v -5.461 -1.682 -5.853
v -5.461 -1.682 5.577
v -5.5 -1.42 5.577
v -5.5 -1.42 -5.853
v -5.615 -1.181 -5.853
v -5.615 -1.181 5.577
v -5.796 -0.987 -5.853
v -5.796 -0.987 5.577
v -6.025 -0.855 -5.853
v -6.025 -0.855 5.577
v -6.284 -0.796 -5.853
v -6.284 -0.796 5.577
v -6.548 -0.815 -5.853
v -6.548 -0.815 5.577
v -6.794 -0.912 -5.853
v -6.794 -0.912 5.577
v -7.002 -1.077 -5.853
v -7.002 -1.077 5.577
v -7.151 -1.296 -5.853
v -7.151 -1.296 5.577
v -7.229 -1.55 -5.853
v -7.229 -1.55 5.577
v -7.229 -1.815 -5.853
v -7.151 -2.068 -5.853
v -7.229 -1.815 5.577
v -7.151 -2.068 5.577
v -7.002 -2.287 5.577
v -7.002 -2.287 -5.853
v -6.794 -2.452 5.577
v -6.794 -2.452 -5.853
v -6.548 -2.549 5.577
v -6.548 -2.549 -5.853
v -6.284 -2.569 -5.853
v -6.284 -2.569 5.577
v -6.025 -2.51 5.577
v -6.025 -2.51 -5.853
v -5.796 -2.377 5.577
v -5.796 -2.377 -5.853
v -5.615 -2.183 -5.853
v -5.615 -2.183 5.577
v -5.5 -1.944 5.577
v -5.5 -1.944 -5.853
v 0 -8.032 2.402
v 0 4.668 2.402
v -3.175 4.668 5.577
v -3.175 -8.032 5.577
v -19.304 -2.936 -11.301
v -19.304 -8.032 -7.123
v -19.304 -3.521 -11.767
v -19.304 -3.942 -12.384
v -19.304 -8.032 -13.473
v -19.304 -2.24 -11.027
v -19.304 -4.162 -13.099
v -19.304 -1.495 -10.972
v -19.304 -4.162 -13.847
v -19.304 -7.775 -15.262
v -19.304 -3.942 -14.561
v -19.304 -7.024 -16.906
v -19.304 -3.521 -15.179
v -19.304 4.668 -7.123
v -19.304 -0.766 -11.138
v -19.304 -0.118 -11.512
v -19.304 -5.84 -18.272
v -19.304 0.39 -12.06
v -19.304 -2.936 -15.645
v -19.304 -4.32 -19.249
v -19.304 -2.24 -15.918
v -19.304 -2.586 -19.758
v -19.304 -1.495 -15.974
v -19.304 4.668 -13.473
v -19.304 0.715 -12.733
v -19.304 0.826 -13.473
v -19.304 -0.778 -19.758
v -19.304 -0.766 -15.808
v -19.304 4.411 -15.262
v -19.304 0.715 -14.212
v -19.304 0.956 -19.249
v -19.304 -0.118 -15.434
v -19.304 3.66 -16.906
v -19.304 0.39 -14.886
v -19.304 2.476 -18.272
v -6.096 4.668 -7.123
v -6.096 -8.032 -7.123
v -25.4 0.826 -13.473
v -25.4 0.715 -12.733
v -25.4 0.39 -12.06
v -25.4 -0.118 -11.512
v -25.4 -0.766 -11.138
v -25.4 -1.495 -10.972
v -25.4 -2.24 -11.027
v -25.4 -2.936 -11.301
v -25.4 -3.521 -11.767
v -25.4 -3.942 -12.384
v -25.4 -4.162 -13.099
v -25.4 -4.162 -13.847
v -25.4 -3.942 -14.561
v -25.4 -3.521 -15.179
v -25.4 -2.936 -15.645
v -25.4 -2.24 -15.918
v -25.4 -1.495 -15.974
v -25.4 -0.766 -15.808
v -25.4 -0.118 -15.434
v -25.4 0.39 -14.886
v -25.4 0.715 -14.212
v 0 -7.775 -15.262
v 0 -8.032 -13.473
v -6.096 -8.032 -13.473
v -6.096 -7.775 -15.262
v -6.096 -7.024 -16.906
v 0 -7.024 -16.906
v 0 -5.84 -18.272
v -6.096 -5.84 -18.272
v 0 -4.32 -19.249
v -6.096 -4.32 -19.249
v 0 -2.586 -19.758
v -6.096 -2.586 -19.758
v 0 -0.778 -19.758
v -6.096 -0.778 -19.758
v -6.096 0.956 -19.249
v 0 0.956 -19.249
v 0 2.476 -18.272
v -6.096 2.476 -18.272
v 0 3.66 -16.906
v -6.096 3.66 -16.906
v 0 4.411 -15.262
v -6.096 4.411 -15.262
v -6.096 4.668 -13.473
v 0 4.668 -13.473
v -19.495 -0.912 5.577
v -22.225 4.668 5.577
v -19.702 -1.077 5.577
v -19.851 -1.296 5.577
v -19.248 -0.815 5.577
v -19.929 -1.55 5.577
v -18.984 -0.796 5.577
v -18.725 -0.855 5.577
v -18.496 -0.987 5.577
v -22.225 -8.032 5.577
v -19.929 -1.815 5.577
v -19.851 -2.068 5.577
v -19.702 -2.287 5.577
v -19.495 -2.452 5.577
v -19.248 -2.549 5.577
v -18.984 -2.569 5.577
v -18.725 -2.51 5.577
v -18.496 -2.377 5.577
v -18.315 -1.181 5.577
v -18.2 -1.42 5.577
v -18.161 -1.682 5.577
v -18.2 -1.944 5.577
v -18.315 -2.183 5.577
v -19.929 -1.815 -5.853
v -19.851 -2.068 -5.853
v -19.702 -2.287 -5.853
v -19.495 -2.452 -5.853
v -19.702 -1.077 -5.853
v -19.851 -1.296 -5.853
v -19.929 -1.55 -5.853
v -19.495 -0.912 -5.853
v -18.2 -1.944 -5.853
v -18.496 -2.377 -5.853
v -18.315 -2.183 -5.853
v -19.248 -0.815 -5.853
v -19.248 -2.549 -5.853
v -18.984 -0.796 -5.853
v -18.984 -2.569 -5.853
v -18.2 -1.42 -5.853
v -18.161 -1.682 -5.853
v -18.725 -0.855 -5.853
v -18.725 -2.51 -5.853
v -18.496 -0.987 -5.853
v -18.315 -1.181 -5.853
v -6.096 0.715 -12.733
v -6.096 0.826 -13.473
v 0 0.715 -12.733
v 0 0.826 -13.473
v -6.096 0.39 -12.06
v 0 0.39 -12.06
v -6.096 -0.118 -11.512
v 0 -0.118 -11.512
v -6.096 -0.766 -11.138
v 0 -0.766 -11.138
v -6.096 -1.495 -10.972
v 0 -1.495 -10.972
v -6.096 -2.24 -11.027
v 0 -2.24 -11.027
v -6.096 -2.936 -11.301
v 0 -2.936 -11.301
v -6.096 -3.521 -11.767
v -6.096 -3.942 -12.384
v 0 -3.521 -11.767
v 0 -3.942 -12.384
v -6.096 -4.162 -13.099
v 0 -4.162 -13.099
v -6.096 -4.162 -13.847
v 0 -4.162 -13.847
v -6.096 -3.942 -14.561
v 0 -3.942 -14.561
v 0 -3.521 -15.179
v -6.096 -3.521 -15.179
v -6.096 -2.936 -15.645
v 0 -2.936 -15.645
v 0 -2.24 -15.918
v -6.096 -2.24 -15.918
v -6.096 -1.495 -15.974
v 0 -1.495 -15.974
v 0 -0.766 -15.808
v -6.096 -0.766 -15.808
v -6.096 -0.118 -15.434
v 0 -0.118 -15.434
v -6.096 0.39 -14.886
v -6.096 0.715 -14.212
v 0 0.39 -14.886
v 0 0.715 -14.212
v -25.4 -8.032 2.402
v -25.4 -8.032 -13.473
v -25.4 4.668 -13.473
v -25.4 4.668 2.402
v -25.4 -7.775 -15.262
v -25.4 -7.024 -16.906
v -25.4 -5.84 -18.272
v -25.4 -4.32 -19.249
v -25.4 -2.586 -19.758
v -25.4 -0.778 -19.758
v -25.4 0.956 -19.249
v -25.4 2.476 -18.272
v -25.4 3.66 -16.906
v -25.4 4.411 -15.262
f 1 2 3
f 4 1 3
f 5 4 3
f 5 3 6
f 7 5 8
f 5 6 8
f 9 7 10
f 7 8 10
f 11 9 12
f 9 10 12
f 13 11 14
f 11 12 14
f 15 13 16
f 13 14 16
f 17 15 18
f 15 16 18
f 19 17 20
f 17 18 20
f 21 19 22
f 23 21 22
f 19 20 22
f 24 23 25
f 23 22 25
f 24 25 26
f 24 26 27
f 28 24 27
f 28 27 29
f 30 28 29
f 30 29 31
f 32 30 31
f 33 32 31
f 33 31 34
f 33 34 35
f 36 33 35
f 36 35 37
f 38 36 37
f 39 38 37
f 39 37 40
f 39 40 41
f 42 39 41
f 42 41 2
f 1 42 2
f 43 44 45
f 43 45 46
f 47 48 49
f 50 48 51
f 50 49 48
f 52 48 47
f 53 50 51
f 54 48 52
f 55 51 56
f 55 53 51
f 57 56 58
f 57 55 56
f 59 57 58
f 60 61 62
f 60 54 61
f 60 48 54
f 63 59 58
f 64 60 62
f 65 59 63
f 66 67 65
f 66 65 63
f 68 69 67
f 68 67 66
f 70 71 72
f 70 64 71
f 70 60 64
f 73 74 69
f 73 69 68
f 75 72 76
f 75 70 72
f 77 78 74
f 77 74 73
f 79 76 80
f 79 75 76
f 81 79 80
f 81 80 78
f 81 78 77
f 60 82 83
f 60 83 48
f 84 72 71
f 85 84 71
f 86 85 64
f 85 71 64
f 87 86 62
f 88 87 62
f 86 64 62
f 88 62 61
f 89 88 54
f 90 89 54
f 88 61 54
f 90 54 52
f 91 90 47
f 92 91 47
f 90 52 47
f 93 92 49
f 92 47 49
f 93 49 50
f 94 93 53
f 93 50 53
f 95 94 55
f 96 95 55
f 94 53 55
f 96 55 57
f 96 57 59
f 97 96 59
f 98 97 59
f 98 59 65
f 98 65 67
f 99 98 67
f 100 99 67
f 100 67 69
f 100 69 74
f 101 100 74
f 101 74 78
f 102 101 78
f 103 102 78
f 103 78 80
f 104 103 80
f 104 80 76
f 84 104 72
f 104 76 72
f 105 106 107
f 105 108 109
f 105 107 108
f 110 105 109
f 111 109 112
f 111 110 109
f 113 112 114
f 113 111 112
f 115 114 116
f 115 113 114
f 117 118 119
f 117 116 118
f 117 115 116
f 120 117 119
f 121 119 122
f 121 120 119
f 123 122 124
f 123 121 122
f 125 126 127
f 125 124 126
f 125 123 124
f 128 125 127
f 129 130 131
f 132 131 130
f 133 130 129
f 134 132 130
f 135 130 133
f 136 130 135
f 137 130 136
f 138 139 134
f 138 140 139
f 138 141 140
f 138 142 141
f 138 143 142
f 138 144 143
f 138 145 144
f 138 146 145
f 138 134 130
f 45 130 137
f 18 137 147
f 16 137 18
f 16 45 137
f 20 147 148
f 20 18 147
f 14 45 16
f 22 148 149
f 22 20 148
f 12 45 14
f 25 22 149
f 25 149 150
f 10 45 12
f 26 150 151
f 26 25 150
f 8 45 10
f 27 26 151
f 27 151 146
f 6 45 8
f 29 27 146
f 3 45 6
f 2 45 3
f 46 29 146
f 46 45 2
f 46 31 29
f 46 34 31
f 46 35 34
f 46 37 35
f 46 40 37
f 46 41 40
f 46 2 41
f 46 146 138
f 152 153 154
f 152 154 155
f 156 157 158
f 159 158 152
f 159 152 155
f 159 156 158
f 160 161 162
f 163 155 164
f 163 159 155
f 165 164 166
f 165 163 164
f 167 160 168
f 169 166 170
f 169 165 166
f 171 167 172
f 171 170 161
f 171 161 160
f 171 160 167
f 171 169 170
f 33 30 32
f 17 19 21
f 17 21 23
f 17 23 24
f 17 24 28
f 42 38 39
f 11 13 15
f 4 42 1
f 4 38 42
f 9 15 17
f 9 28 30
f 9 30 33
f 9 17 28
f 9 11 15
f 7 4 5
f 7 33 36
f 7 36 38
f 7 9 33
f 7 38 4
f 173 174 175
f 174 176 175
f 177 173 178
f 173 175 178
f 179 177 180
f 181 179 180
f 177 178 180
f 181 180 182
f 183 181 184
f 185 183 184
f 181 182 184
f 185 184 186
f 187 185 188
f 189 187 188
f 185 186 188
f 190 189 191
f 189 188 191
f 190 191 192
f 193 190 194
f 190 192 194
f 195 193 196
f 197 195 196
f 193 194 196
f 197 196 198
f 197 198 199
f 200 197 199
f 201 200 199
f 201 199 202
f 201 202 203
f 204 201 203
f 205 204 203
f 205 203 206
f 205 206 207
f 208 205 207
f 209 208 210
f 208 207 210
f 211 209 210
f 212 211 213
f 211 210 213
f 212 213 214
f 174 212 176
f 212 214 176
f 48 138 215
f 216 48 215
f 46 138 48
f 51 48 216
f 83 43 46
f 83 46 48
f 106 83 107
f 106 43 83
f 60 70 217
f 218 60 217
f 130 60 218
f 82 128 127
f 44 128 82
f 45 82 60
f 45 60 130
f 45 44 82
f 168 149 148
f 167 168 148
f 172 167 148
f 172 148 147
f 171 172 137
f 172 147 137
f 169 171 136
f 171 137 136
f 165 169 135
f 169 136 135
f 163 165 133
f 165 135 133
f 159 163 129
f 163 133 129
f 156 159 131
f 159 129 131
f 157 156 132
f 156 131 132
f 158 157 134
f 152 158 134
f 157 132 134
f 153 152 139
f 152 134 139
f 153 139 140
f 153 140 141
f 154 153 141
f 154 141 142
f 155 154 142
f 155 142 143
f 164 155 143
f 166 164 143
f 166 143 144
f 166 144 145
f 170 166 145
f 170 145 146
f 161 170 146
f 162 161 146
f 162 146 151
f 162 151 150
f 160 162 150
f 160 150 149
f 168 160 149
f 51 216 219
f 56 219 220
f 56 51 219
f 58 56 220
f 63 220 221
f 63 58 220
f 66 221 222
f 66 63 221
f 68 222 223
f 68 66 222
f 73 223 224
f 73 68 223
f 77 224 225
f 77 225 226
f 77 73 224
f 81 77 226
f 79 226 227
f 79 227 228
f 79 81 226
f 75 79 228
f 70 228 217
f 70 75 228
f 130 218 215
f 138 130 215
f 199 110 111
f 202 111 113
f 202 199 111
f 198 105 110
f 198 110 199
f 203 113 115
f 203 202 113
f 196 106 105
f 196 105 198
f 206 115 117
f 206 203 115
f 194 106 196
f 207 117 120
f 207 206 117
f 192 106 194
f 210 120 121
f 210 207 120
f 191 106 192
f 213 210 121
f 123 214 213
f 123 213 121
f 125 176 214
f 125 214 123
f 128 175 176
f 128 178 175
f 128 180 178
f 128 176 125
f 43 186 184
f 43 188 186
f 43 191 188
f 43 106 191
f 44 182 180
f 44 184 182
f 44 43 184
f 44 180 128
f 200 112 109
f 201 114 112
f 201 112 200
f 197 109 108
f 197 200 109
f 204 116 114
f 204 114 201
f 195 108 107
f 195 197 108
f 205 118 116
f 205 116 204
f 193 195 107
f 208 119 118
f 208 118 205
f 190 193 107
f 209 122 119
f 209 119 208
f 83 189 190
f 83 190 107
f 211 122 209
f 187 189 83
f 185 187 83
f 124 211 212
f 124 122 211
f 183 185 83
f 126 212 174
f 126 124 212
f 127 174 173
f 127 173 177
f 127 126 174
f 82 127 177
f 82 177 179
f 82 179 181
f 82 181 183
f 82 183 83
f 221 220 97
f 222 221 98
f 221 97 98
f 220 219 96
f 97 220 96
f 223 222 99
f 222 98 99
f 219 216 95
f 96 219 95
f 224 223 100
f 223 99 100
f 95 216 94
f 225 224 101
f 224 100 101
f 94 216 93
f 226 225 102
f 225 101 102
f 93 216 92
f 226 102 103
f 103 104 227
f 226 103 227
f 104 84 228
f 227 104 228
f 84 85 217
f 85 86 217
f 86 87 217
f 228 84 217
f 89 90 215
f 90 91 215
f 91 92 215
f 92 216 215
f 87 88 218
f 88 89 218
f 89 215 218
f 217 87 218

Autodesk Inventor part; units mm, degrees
ref_plane "YZ Plane" through (0, 0, 0) normal (1, 0, 0) x (0, 1, 0)
ref_plane "XZ Plane" through (0, 0, 0) normal (0, 1, 0) x (-1, 0, 0)
ref_plane "XY Plane" through (0, 0, 0) normal (0, 0, 1) x (1, 0, 0)
sketch "Sketch1" plane through (0, 0, 0) normal (1, 0, 0) x (0, 1, 0)
  line L0 (4.6679, 5.5772) -> (-8.0321, 5.5772)
  line L1 (-8.0321, 5.5772) -> (-8.0321, -13.4728)
  line L2 (-1.6821, -19.8228) -> (-1.6821, -19.8228)
  line L3 (4.6679, -13.4728) -> (4.6679, 5.5772)
  circle A0 centre (-1.6821, -13.4728) radius 2.5083
  arc A1 (-1.6821, -19.8228) -> (4.6679, -13.4728) centre (-1.6821, -13.4728) ccw
  arc A2 (-8.0321, -13.4728) -> (-1.6821, -19.8228) centre (-1.6821, -13.4728) ccw
  point P0 (0, 0)
  point P1 (-8.0321, -19.8228)
  point P2 (4.6679, -19.8228)
  dimension "d0" = 12.7
  dimension "d1" = 25.4
  dimension "d2" = 5.0165
  dimension "d3" = 6.35
  dimension "d4" = 6.35
extrude "Extrusion1" add sketch "Sketch1" against normal blind 25.4
sketch "Sketch2" plane through (0, -8.0321, 5.5772) normal (0, 0, 1) x (1, 0, 0)
  line L0 (0, 0) -> (-25.4, 0) projected
  line L1 (0, 12.7) -> (0, 0) projected
  circle A0 centre (-6.35, 6.35) radius 0.889
  circle A1 centre (-19.05, 6.35) radius 0.889
  line L2 (-25.4, 0) -> (-25.4, 12.7) projected
  point P0 (0, 8.0321)
  point P1 (-12.7, 6.35)
  dimension "d7" = 6.35
  dimension "d8" = 12.7
  dimension "d9" = 1.778
  dimension "d10" = 6.35
  dimension "d11" = 1.778
  dimension "d12" = 6.35
extrude "Extrusion2" cut sketch "Sketch2" against normal blind 11.43
chamfer "Chamfer1" distance 3.175 angle 45 2 edges at (0, -1.6821, 5.5772) (-25.4, -1.6821, 5.5772)
sketch "Sketch3" plane through (-25.4, 4.6679, -13.4728) normal (0, 1, 0) x (1, 0, 0)
  line L0 (25.4, 6.35) -> (0, 6.35) projected
  line L1 (6.096, 6.35) -> (19.304, 6.35)
  line L2 (19.304, 6.35) -> (19.304, -6.35)
  line L3 (19.304, -6.35) -> (6.096, -6.35)
  line L4 (6.096, -6.35) -> (6.096, 6.35)
  line L5 (25.4, 0) -> (25.4, 6.35) projected
  line L6 (0, 6.35) -> (0, 0) projected
  point P0 (25.4, -13.4728)
  dimension "d18" = 12.7
  dimension "d19" = 6.096
  dimension "d20" = 6.096
extrude "Extrusion3" cut sketch "Sketch3" against normal blind 12.7
properties part number "band_hinge"
